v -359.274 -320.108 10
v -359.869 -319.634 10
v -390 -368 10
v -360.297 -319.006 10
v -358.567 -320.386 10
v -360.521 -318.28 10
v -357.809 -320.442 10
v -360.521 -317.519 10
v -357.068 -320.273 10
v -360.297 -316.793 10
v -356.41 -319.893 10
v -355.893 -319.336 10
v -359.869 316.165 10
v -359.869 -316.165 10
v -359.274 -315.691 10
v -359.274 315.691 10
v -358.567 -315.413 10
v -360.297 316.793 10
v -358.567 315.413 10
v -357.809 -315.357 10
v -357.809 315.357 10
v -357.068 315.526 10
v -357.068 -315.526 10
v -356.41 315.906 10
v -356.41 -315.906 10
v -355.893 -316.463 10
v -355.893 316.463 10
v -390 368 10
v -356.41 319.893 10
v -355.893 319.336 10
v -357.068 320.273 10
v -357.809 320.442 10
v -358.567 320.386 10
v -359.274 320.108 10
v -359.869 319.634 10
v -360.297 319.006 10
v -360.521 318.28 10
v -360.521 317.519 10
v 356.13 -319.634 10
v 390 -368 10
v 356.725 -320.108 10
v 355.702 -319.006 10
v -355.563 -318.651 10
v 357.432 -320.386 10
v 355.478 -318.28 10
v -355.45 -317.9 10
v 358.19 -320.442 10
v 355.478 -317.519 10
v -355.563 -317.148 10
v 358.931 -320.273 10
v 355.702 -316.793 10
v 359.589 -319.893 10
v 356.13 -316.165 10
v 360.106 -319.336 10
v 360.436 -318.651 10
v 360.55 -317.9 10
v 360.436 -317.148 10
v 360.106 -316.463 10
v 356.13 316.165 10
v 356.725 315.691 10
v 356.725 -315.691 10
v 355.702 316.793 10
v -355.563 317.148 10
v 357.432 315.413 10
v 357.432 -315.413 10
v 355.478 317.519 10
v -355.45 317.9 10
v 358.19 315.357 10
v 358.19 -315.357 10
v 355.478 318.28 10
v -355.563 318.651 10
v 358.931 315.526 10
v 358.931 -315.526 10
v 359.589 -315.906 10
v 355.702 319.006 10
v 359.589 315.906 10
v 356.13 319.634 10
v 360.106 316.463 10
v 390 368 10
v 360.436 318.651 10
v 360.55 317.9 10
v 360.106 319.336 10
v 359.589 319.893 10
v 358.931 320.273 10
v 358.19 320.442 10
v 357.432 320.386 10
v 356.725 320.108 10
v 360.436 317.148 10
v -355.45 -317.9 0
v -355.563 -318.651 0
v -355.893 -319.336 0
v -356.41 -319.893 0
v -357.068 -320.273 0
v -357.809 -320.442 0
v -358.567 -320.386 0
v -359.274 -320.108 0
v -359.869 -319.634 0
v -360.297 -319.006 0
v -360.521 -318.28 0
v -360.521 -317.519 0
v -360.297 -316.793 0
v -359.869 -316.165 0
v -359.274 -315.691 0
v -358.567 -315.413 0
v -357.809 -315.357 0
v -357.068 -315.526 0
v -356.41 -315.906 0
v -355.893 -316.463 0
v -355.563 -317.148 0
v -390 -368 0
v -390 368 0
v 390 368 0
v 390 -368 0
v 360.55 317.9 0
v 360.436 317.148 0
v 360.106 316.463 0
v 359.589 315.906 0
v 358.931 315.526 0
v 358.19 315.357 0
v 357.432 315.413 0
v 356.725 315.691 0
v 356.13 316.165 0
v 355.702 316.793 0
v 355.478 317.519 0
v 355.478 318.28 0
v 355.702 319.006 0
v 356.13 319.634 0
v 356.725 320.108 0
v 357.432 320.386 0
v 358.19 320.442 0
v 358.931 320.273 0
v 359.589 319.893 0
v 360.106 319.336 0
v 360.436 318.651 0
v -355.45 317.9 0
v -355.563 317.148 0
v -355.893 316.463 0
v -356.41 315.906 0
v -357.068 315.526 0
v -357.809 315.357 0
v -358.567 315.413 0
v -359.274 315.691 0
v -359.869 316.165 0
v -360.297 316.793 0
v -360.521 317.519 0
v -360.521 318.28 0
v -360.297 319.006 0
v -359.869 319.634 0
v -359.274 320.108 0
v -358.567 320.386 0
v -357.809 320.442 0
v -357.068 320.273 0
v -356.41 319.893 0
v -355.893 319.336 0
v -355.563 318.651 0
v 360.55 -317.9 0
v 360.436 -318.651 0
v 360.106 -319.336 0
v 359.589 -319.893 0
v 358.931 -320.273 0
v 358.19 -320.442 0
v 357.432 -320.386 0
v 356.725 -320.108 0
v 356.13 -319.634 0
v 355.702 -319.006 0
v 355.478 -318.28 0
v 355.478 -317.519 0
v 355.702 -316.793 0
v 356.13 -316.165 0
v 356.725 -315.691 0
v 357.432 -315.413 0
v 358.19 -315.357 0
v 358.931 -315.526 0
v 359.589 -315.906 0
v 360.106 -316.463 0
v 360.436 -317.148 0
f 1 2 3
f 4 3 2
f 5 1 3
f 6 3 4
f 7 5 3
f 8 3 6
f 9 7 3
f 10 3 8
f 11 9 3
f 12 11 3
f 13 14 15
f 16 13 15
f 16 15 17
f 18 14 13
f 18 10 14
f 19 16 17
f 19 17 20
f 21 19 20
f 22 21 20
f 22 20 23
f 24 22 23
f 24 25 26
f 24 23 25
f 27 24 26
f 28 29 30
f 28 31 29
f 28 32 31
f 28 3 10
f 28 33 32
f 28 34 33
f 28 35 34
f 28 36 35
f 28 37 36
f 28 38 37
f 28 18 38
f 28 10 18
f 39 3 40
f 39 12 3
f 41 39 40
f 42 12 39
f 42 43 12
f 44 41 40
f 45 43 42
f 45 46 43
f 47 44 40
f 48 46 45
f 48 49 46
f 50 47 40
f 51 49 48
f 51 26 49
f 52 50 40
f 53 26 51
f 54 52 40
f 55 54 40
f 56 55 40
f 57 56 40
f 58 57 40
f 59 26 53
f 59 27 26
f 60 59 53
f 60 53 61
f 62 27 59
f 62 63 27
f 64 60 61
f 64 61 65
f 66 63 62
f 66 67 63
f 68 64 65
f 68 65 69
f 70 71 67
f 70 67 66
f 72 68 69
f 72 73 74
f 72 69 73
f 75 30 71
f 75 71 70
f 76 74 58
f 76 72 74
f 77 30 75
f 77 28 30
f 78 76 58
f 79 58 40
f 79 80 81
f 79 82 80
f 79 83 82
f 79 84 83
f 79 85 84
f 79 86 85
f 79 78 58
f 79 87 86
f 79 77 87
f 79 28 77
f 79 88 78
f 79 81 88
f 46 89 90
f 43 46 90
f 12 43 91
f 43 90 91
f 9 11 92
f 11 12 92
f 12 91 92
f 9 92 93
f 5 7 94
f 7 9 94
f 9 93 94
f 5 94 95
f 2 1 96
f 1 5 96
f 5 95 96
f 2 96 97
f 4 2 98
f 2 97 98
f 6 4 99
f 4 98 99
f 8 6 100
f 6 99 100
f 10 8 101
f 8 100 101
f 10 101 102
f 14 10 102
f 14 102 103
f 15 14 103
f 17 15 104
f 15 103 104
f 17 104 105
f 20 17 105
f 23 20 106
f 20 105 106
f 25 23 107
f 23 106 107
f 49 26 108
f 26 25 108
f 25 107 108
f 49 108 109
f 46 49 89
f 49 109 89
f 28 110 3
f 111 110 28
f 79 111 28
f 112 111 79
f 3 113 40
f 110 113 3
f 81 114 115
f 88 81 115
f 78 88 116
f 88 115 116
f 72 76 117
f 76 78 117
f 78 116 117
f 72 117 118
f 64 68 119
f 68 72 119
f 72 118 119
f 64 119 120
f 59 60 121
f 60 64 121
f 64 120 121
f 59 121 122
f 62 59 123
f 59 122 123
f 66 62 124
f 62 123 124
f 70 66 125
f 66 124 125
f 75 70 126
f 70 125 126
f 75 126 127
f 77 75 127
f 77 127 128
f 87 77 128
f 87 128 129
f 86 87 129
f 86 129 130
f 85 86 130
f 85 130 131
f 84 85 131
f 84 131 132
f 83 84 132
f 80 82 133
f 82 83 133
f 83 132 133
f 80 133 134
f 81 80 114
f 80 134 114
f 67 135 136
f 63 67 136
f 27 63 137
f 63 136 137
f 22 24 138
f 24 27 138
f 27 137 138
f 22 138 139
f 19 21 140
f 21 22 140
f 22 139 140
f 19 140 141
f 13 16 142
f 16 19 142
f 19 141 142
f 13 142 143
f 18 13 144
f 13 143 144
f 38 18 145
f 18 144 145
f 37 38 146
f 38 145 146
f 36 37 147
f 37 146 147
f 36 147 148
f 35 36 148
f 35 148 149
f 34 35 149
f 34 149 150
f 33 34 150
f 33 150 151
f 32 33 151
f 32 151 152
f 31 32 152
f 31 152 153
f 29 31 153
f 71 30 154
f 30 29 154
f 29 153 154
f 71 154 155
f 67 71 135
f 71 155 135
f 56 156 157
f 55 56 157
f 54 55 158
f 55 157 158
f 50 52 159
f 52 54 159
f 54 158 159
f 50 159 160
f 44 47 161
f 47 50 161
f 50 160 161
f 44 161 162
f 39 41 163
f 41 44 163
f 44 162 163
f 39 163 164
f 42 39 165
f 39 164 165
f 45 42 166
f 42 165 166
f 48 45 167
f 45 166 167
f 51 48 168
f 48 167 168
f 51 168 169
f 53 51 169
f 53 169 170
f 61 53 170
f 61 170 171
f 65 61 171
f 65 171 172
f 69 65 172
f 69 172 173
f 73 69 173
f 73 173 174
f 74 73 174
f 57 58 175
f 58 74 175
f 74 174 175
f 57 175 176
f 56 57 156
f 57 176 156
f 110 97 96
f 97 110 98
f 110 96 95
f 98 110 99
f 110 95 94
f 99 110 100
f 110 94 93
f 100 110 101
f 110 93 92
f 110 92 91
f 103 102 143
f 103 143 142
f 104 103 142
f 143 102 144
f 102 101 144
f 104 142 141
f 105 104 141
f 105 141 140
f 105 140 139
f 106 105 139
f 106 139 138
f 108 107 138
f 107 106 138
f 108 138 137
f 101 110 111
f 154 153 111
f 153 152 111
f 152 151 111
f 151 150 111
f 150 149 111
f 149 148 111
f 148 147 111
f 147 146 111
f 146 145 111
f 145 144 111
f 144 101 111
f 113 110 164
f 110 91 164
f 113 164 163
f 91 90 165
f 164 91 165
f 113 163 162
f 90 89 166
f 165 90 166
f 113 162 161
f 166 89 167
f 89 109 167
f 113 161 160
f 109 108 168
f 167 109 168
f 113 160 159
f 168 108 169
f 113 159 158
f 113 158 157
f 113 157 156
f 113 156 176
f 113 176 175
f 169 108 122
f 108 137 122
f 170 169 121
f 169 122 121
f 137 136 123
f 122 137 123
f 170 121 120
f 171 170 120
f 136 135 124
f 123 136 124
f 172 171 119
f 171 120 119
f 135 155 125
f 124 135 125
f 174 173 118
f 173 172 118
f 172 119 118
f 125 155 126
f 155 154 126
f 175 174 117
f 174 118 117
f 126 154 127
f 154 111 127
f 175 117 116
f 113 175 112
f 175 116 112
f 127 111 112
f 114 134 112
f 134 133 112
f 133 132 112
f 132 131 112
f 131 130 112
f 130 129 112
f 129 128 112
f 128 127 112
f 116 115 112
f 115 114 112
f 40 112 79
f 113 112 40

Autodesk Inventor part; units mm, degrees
ref_plane "YZ Plane" through (0, 0, 0) normal (1, 0, 0) x (0, 1, 0)
ref_plane "XZ Plane" through (0, 0, 0) normal (0, 1, 0) x (-1, 0, 0)
ref_plane "XY Plane" through (0, 0, 0) normal (0, 0, 1) x (1, 0, 0)
sketch "Sketch1" plane through (0, 0, 0) normal (0, 0, 1) x (1, 0, 0)
  line L0 (-390, 368) -> (390, 368)
  line L1 (390, 368) -> (390, -368)
  line L2 (390, -368) -> (-390, -368)
  line L3 (-390, -368) -> (-390, 368)
  line L4 (0, 368) -> (0, 0) construction
  line L5 (0, 0) -> (390, 0) construction
  circle A0 centre (357.9995, 317.8995) radius 2.55
  circle A1 centre (-357.9995, 317.8995) radius 2.55
  circle A2 centre (357.9995, -317.8995) radius 2.55
  circle A3 centre (-357.9995, -317.8995) radius 2.55
  point P0 (-390, 0)
  dimension "d0" = 736
  dimension "d1" = 780
  dimension "d2" = 5.1
  dimension "d3" = 317.8995
  dimension "d4" = 715.999
extrude "Extrusion1" add sketch "Sketch1" along normal blind 10
properties part number "lamina"
